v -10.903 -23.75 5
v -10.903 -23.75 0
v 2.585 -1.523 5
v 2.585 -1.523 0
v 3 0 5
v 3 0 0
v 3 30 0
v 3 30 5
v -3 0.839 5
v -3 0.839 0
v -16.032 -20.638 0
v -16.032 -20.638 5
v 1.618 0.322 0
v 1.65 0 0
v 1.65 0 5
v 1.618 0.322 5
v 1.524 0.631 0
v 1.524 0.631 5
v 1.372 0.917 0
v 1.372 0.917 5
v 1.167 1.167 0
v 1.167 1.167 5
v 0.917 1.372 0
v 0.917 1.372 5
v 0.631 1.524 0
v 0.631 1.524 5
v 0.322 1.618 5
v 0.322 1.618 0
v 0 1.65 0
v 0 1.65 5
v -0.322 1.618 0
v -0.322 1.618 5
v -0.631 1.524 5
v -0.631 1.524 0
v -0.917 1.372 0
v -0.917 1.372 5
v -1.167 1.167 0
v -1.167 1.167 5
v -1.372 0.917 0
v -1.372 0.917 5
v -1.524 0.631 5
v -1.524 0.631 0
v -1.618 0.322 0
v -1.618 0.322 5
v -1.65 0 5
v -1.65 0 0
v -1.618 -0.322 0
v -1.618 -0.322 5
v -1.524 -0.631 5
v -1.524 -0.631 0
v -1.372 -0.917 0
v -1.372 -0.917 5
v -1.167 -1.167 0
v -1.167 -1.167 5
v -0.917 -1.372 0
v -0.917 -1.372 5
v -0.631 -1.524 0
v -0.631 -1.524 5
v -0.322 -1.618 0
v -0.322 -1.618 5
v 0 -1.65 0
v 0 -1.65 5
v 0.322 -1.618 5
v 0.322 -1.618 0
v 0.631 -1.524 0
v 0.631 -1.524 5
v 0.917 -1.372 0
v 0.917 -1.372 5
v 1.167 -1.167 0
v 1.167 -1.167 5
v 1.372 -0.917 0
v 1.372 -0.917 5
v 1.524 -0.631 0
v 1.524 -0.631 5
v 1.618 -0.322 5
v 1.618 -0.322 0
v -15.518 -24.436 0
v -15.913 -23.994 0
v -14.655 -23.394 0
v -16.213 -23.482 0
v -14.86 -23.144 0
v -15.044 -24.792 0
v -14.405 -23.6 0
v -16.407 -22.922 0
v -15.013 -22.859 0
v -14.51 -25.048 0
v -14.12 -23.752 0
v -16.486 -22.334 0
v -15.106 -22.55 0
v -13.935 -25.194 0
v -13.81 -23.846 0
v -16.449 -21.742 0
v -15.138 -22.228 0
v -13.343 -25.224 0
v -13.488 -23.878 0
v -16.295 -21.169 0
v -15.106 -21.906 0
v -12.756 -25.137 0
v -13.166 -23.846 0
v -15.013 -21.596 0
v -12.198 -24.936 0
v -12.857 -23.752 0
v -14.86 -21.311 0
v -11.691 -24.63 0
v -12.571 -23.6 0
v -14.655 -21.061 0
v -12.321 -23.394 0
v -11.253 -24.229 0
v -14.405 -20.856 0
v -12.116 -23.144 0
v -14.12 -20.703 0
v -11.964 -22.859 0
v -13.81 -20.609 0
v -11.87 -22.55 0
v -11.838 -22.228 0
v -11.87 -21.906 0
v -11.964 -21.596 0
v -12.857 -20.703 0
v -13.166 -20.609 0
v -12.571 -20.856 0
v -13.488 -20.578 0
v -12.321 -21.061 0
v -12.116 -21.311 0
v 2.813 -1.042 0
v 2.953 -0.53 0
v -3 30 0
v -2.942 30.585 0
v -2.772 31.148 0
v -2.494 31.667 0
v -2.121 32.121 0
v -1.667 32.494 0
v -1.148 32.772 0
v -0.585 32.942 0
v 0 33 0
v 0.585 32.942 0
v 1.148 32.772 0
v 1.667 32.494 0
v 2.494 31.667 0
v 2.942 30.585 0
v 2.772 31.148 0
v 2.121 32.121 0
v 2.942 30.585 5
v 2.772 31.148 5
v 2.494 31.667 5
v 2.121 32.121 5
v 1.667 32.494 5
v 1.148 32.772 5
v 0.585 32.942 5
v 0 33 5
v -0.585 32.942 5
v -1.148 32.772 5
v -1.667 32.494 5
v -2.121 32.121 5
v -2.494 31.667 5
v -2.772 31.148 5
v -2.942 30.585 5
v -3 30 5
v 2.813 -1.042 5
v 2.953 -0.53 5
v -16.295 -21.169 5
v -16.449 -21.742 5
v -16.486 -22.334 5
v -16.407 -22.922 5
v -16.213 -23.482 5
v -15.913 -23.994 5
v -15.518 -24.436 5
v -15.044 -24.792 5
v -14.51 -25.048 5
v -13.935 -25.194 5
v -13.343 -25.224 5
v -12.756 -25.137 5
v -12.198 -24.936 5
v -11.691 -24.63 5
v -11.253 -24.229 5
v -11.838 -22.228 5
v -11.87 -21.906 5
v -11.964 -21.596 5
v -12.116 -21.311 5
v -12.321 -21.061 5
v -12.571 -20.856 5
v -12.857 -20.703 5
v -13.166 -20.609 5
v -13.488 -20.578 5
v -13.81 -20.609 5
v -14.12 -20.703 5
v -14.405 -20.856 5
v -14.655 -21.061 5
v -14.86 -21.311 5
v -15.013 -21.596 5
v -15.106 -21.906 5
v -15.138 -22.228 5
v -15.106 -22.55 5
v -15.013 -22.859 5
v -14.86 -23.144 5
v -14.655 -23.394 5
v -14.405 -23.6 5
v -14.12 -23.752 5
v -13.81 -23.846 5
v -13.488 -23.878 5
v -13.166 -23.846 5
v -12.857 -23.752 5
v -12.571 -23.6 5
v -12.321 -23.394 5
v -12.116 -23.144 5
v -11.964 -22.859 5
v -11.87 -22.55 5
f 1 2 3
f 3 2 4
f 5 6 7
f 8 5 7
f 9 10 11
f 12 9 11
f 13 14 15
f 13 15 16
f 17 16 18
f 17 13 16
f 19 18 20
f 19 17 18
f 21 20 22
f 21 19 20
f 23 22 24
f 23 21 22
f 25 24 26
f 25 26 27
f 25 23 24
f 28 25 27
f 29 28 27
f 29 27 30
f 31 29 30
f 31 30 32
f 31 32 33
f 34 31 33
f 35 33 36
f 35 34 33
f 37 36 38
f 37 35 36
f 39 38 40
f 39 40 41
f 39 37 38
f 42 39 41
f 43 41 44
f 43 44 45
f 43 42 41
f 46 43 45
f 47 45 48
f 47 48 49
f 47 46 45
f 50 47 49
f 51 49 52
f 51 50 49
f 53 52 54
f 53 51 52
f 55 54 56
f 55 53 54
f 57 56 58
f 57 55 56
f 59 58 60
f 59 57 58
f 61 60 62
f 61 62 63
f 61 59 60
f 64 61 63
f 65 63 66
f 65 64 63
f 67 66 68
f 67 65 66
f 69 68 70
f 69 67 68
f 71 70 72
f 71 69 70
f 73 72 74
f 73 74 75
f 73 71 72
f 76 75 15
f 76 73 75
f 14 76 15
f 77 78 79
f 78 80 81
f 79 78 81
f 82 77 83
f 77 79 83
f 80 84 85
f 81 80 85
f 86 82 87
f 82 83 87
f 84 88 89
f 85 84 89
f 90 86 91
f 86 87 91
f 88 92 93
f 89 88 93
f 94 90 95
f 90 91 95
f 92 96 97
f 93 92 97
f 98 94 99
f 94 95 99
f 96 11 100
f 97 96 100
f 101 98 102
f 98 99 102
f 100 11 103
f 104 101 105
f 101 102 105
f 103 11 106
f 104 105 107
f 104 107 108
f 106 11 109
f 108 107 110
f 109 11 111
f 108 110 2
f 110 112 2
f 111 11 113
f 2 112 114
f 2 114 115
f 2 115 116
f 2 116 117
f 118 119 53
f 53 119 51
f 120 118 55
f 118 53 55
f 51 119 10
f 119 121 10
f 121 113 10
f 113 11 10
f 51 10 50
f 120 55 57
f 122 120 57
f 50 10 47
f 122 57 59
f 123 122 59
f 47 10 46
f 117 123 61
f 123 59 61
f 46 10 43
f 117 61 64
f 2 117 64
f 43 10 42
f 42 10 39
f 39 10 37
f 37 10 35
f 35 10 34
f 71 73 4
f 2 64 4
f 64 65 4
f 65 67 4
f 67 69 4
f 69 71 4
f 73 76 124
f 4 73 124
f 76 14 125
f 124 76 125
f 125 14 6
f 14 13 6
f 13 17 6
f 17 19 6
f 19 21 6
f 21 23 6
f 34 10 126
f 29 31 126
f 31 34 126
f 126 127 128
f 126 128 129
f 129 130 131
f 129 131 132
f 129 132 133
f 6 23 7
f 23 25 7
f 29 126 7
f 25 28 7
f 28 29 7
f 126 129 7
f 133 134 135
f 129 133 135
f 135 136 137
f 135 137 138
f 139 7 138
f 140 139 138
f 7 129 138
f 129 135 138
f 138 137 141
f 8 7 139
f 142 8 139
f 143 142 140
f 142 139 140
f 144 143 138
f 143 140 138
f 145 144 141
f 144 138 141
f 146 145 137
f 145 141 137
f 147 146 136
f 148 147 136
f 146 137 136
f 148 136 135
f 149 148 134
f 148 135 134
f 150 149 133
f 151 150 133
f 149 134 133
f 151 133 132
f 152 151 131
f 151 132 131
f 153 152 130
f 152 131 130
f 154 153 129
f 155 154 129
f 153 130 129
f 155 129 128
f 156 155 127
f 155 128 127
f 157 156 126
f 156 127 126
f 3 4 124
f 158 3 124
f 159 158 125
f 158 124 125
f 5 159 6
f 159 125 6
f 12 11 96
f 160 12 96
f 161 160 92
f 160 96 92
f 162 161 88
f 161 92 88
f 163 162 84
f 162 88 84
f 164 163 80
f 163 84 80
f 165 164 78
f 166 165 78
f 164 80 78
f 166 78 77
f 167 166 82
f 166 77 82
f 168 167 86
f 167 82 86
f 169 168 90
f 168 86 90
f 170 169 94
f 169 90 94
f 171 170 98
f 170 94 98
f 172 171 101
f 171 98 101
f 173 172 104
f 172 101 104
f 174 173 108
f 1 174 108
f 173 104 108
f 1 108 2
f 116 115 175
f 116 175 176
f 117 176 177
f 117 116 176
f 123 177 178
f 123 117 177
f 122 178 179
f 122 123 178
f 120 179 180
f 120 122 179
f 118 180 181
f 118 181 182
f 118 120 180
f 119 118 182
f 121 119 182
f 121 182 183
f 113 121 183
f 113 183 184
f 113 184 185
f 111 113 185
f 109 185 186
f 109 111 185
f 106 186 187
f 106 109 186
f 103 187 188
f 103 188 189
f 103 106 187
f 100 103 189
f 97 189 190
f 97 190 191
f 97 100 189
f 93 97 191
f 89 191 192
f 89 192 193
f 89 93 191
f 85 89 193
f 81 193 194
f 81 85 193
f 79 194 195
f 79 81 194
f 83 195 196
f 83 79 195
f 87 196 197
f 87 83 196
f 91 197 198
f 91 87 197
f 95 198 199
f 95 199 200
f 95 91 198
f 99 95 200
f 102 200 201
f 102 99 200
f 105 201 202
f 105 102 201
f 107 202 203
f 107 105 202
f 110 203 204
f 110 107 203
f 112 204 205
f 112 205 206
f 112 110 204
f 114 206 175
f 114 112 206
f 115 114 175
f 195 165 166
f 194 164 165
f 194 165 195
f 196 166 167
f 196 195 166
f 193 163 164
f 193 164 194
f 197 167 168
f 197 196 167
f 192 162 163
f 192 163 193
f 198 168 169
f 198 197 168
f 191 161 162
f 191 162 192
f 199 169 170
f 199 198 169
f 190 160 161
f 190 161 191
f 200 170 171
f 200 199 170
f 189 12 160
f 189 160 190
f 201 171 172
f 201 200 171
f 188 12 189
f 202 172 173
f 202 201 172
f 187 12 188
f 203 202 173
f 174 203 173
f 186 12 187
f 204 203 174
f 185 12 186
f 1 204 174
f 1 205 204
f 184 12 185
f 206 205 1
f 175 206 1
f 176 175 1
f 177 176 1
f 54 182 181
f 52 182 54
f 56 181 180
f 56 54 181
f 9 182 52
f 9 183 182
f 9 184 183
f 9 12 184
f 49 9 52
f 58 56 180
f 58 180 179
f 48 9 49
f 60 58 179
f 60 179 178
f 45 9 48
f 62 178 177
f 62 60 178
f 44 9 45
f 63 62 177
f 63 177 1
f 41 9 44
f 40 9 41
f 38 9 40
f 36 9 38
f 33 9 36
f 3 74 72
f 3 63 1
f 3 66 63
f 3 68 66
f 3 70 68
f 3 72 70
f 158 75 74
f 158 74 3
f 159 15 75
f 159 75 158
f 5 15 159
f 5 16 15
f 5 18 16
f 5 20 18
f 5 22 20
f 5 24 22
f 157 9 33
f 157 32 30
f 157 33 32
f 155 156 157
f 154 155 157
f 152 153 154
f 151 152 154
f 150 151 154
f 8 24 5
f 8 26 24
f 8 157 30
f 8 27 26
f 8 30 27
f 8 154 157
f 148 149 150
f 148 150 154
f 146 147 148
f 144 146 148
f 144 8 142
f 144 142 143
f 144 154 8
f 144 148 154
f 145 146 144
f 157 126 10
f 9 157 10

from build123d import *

# Parameters (mm, degrees)
SKIZZE1_R                       = 1.65
AUFSATZ_LINEAR_AUSTRAGEN1_DEPTH = 5


with BuildPart() as part:
    # Skizze1 → Aufsatz-Linear austragen1 (new body)
    with BuildSketch(Plane.XY):
        with BuildLine():
            Line((-3, 0.83853083), (-16.032249001, -20.637950845))
            ThreePointArc((-16.032249001, -20.637950845), (-15.044424487, -24.79244425), (-10.903217231, -23.750323726))
            Line((-10.903217231, -23.750323726), (2.584887481, -1.522615089))
            ThreePointArc((2.584887481, -1.522615089), (2.894361971, -0.789093643), (3, 0))
            Line((3, 0), (3, 30))
            ThreePointArc((3, 30), (0, 33), (-3, 30))
            Line((-3, 30), (-3, 0.83853083))
        make_face()
        Circle(SKIZZE1_R, mode=Mode.SUBTRACT)
        with Locations((-13.488104712, -22.227708637)):
            Circle(SKIZZE1_R, mode=Mode.SUBTRACT)
    extrude(amount=AUFSATZ_LINEAR_AUSTRAGEN1_DEPTH)


solid = part.part
